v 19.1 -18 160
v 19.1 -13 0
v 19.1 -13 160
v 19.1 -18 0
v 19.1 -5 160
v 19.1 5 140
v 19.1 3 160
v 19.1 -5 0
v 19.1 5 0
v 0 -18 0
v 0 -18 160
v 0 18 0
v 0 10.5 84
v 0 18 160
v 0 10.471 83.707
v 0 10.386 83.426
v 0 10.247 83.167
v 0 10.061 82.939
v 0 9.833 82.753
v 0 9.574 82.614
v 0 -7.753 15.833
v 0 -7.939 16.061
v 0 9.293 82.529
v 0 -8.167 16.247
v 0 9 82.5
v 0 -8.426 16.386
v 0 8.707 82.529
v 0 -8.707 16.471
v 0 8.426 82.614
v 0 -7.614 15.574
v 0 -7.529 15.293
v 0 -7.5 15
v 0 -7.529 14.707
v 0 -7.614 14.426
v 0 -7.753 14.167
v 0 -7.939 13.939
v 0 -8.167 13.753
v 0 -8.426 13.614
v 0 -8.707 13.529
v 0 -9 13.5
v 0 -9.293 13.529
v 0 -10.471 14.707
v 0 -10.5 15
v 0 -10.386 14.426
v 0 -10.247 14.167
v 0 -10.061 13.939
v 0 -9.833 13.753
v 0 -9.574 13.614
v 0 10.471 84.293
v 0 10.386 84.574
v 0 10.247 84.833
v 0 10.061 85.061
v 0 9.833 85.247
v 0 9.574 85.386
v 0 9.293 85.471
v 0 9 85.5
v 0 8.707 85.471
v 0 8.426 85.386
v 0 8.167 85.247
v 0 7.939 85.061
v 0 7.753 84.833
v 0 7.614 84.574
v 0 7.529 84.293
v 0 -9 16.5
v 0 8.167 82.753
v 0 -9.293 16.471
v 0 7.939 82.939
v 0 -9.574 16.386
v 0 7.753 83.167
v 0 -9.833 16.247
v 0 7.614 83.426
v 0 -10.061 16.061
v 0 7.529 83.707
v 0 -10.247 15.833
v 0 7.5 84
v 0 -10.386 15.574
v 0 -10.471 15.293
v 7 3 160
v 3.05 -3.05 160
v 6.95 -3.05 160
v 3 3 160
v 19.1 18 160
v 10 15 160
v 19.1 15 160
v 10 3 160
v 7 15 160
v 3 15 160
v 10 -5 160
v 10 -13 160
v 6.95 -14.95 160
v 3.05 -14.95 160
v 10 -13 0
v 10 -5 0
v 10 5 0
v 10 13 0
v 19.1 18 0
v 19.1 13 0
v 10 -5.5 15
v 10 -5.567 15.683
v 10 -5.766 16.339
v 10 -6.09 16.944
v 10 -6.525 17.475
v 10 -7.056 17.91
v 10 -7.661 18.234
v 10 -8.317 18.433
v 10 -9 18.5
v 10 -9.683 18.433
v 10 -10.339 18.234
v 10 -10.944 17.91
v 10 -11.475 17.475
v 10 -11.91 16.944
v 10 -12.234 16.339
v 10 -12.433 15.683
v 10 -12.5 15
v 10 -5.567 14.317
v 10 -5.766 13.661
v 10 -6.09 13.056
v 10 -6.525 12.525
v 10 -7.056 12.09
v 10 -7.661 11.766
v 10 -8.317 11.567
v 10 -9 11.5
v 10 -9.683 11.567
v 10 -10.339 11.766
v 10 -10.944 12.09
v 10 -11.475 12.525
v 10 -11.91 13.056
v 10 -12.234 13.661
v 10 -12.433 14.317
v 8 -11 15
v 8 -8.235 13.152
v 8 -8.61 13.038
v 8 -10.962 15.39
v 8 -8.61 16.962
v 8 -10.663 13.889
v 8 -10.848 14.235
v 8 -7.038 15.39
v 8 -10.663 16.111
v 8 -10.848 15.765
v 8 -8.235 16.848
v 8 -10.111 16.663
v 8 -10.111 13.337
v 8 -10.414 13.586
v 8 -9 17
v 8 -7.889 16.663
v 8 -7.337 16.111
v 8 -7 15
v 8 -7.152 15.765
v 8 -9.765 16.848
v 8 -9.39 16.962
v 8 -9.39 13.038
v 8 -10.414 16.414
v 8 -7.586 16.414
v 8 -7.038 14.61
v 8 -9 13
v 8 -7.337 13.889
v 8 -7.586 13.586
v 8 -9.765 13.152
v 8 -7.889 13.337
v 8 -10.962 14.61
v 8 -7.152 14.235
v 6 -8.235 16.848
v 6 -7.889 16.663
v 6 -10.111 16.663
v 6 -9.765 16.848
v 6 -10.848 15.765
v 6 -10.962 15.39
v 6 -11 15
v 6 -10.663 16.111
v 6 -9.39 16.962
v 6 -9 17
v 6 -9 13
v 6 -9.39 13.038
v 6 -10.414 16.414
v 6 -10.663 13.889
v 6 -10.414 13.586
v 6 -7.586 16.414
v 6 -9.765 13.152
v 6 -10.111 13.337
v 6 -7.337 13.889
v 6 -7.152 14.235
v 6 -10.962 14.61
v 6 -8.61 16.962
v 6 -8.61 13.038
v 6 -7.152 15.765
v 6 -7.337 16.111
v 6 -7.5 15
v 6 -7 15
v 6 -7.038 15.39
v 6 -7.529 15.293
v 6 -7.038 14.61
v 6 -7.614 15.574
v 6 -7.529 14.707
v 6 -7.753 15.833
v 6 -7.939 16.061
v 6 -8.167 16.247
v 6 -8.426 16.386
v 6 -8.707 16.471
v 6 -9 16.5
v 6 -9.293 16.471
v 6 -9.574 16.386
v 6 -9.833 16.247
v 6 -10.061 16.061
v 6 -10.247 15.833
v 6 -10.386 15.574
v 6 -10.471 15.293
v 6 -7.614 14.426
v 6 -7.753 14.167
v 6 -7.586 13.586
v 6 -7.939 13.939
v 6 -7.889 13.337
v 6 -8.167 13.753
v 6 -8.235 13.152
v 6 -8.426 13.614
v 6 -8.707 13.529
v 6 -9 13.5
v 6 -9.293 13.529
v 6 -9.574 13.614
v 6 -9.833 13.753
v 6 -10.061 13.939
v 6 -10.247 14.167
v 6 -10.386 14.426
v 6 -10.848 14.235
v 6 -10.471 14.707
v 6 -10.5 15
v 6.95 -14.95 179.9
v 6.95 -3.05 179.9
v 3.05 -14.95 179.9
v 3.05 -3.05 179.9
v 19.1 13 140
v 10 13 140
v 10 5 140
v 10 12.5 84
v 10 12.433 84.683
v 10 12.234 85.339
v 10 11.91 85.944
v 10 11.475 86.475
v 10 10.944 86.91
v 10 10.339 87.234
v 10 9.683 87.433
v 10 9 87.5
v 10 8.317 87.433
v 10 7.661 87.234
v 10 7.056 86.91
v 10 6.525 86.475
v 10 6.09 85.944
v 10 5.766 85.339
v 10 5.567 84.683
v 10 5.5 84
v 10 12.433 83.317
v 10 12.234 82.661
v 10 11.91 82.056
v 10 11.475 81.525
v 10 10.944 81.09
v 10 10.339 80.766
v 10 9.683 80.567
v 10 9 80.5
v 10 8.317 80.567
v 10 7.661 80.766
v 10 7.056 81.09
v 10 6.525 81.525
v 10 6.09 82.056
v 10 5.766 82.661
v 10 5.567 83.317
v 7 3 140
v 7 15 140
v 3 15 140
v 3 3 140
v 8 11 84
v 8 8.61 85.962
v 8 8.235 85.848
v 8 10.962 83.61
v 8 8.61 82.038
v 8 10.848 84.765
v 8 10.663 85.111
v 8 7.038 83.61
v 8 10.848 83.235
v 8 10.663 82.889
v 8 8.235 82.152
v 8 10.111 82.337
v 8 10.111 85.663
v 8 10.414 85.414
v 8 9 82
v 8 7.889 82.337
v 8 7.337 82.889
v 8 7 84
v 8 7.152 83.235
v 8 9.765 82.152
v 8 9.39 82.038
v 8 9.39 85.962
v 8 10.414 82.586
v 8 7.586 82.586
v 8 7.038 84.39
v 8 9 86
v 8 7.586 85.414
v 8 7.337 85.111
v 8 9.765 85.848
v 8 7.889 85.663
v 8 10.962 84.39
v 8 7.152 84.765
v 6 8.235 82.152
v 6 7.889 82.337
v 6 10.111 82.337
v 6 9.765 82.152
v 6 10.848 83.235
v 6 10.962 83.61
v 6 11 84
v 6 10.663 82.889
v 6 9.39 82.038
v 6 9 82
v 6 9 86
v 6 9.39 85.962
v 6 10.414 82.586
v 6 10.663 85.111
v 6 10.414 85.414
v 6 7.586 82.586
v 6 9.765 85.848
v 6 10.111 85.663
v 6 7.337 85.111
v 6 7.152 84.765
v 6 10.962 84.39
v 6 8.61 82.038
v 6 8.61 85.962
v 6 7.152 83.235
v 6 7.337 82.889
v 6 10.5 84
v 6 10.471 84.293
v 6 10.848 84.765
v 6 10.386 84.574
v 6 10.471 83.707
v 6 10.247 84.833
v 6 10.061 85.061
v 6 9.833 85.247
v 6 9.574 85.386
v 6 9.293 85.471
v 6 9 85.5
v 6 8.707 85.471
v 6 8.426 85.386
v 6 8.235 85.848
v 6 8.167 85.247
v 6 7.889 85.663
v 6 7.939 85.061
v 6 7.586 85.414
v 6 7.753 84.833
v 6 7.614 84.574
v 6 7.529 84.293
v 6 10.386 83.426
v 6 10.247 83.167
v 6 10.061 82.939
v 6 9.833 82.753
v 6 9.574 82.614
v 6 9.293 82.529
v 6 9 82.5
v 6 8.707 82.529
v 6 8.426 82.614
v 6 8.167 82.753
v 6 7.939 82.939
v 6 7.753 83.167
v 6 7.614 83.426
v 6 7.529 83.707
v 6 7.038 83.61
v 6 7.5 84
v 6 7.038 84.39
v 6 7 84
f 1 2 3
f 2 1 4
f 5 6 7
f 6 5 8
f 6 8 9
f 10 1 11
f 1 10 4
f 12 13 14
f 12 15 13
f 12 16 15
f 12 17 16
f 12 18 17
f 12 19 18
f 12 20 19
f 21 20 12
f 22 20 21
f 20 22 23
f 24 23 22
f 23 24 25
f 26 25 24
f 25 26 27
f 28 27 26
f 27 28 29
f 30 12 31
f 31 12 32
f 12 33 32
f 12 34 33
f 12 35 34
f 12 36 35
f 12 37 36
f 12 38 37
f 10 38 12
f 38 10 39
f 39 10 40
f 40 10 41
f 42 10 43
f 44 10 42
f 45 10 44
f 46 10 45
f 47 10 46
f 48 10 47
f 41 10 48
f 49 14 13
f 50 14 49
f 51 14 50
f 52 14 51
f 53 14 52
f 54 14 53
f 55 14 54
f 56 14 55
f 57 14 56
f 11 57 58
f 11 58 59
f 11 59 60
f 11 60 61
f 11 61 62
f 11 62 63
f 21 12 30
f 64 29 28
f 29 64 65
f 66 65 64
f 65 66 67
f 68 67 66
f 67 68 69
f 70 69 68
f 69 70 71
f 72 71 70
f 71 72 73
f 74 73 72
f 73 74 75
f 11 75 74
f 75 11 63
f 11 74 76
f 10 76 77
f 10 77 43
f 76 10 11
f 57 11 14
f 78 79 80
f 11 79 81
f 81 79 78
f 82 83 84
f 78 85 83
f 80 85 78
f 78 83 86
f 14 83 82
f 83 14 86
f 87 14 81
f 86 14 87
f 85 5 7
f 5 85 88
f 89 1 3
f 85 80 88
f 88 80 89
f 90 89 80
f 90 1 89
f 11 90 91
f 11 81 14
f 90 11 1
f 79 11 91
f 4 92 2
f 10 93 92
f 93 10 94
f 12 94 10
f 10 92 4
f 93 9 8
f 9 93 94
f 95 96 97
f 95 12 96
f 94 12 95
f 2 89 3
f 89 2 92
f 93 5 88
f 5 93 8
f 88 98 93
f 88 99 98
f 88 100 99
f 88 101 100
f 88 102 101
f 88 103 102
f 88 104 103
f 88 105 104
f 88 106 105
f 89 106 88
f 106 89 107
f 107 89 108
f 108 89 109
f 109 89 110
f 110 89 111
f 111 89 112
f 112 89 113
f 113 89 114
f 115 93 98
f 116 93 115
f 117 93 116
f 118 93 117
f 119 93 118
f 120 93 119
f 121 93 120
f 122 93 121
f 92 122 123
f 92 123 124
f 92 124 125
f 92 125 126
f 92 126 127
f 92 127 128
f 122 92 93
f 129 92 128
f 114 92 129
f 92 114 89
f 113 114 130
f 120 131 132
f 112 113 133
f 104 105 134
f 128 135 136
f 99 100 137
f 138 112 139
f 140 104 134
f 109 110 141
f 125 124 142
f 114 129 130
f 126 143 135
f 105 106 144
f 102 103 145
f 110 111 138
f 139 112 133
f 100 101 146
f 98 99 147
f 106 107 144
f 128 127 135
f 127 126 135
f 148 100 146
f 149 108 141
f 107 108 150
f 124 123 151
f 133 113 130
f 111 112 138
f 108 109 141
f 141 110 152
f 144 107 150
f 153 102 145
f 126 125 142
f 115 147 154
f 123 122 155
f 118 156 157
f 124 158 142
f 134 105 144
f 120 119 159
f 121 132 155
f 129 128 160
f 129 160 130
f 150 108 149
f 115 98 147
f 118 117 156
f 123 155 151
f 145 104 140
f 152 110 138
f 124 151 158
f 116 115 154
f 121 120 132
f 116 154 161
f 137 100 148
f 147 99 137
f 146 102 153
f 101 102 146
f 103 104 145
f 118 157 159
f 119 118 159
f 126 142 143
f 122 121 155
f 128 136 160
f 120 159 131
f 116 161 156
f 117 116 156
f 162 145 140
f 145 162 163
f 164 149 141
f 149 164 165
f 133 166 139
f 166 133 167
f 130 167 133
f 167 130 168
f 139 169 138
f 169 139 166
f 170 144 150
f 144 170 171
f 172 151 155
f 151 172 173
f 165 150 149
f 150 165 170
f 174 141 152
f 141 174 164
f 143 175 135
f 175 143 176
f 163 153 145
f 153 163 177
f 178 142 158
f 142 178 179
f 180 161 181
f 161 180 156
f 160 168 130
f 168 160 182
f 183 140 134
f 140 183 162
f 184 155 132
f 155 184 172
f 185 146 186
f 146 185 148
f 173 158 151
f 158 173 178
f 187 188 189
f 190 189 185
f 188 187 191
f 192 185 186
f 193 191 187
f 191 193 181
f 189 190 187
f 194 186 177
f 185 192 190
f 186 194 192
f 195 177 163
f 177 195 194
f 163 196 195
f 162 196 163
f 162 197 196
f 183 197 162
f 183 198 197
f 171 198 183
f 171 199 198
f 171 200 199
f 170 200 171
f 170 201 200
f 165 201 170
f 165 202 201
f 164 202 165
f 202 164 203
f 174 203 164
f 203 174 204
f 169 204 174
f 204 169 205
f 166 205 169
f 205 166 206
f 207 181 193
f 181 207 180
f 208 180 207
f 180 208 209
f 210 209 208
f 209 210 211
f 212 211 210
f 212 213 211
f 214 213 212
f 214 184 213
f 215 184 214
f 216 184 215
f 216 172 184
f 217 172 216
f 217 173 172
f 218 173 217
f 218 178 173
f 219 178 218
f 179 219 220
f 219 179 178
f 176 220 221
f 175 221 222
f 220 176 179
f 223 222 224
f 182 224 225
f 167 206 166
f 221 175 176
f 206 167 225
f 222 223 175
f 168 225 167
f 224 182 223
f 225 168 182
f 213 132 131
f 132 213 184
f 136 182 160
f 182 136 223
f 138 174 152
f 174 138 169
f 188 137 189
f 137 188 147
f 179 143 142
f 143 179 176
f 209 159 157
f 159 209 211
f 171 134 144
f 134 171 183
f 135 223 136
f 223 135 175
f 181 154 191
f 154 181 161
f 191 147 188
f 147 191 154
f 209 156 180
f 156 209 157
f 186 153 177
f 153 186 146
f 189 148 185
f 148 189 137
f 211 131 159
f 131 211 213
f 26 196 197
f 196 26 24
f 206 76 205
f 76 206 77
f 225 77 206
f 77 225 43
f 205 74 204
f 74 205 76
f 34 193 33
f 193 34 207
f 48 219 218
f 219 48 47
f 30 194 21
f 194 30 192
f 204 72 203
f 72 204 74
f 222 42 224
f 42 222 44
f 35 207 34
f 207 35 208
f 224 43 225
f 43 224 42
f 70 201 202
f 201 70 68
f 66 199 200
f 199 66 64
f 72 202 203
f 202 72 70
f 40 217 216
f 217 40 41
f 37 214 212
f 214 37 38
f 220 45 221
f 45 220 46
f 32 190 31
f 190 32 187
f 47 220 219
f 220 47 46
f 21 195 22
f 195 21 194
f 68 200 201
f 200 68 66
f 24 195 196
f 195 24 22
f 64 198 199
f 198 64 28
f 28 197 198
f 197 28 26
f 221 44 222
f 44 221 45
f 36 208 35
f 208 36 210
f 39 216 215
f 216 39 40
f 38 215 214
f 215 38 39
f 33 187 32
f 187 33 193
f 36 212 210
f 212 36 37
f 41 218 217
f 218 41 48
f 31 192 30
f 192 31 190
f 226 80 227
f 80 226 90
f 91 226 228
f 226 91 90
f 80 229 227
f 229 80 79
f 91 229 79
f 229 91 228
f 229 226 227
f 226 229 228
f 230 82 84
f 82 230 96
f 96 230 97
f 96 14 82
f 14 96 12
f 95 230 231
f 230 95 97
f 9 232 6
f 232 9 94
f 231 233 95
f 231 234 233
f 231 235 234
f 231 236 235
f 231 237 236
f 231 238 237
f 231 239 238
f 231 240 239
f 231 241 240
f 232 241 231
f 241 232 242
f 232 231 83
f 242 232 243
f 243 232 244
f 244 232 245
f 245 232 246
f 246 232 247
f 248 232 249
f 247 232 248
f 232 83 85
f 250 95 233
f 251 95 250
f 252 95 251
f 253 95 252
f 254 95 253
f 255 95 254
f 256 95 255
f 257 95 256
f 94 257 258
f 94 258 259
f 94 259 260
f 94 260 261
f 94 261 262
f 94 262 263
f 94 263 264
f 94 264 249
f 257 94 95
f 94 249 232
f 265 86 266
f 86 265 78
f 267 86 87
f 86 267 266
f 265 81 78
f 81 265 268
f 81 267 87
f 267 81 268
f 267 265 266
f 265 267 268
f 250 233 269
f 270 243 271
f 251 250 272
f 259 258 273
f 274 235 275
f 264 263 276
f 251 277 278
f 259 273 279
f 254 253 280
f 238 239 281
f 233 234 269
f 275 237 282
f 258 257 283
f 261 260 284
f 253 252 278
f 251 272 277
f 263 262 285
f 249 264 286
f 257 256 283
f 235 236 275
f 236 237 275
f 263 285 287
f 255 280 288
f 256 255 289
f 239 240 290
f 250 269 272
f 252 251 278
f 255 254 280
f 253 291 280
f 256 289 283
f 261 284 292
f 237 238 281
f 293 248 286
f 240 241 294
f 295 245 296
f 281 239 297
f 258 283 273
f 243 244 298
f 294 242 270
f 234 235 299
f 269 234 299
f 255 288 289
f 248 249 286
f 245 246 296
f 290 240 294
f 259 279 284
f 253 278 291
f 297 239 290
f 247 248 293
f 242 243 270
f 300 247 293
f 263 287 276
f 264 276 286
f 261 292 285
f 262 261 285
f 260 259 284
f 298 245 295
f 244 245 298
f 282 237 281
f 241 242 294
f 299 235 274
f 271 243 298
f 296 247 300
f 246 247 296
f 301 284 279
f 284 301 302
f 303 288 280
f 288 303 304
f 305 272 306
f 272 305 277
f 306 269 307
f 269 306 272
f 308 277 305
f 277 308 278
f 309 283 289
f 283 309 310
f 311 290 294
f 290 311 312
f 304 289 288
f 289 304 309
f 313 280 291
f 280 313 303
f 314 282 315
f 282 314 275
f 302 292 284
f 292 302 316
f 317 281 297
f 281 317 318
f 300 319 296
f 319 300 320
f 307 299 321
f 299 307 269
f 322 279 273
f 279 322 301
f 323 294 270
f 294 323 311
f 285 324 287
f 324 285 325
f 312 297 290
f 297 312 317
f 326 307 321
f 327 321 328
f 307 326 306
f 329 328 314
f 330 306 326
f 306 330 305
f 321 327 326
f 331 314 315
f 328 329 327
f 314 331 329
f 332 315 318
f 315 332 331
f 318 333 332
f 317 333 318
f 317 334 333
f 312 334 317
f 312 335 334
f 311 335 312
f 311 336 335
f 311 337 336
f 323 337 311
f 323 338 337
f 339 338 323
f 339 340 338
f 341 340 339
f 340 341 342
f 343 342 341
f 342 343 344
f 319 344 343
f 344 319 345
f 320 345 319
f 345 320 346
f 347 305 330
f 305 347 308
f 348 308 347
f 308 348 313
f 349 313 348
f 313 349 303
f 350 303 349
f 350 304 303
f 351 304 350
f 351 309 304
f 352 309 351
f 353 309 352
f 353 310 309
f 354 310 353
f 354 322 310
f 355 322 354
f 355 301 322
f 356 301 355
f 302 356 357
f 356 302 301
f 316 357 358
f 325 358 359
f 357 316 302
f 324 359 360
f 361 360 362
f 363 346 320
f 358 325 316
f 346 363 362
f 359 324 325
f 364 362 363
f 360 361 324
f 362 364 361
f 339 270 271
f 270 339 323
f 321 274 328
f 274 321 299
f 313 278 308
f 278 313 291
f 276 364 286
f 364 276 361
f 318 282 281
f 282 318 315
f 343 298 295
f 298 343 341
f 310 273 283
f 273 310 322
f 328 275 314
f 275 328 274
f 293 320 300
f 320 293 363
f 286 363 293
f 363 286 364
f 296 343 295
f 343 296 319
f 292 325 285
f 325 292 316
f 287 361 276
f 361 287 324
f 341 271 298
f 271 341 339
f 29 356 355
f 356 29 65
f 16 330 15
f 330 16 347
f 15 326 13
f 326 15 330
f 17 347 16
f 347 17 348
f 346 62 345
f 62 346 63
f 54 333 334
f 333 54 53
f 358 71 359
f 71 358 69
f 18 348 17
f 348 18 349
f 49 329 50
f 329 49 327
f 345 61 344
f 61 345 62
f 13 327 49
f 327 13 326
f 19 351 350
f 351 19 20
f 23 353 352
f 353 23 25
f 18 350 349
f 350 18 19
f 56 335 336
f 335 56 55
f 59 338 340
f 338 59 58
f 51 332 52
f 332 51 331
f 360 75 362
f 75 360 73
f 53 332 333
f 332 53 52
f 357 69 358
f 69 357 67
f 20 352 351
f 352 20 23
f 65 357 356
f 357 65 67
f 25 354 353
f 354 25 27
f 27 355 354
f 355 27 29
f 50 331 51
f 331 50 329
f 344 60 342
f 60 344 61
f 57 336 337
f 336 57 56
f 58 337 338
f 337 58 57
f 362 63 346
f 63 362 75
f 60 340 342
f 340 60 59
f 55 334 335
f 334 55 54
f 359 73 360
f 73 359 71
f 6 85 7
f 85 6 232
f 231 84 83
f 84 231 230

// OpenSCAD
// file: lib/shapes.scad
module shapes_wedge(size) {
  width = size[0];
  depth = size[1];
  height = size[2];
  polyhedron(
    points = [
      [0, 0, 0],
      [width, 0, 0],
      [width, depth, 0],
      [0, depth, 0],
      [0, 0, height],
      [width, 0, height]
    ],
    faces = [
      [0, 1, 2, 3],
      [0, 4, 5, 1],
      [0, 3, 4],
      [1, 5, 2],
      [4, 3, 2, 5]
    ]
  );
}
// main file
use <lib/shapes.scad>;

$fn = 32;

tolerance = 0.05;

groove_h = 8;
groove_w = 9.1;
w = 19.1;
d = 320;
h = 18;

half_d = d / 2;

joint_space = 3;
joint_size = [
  w - groove_w - 2 * joint_space,
  20,
  h - 2 * joint_space
];

first_screw = 15;
second_screw = 236;

wedge_h = 2;

module screw_hole() {
  union() {
    cylinder(h = 2, d1 = 7, d2 = 4);
    translate([0, 0, 2])
      cylinder(h = 2, d = 4);
    translate([0, 0, 2 + 2])
      cylinder(h = 30, d = 3);
  }
}

module joint() {
  translate([tolerance, 0, tolerance])
    cube([
      joint_size[0] - 2 * tolerance,
      joint_size[1] - 2 * tolerance,
      joint_size[2] - 2 * tolerance
    ]);
}

module joint_hole() {
  cube(joint_size);
}

module half() {
  difference() {
    cube([w, half_d, h]);
    translate([w - groove_w, 0, h / 2 - groove_h / 2])
      cube([groove_w, half_d, groove_h]);
  }
}

module first_half() {
  union() {
    difference() {
      half();
      translate([w - groove_w, first_screw, h / 2])
        rotate([0, -90, 0])
          screw_hole();
    }
    translate([
        joint_space,
        half_d,
        joint_space
      ])
      joint();
  }
}

module _second_half() {
  difference() {
    half();
    translate([
        joint_space,
        0,
        joint_space
      ])
      joint_hole();
  }
}

module second_half() {
  difference() {
    _second_half();
    translate([w, 0, h / 2 - groove_h / 2])
      rotate([180, 0, 180])
        shapes_wedge([groove_w, 20, wedge_h]);
    translate([w - groove_w, 0, h / 2 + groove_h / 2])
        shapes_wedge([groove_w, 20, wedge_h]);
    translate([w - groove_w, second_screw - half_d, h / 2])
      rotate([0, -90, 0])
        screw_hole();
  }
}

rotate([90, 0, 0]) first_half();
translate([0, 0, half_d]) rotate([-90, 0, 0]) second_half();
